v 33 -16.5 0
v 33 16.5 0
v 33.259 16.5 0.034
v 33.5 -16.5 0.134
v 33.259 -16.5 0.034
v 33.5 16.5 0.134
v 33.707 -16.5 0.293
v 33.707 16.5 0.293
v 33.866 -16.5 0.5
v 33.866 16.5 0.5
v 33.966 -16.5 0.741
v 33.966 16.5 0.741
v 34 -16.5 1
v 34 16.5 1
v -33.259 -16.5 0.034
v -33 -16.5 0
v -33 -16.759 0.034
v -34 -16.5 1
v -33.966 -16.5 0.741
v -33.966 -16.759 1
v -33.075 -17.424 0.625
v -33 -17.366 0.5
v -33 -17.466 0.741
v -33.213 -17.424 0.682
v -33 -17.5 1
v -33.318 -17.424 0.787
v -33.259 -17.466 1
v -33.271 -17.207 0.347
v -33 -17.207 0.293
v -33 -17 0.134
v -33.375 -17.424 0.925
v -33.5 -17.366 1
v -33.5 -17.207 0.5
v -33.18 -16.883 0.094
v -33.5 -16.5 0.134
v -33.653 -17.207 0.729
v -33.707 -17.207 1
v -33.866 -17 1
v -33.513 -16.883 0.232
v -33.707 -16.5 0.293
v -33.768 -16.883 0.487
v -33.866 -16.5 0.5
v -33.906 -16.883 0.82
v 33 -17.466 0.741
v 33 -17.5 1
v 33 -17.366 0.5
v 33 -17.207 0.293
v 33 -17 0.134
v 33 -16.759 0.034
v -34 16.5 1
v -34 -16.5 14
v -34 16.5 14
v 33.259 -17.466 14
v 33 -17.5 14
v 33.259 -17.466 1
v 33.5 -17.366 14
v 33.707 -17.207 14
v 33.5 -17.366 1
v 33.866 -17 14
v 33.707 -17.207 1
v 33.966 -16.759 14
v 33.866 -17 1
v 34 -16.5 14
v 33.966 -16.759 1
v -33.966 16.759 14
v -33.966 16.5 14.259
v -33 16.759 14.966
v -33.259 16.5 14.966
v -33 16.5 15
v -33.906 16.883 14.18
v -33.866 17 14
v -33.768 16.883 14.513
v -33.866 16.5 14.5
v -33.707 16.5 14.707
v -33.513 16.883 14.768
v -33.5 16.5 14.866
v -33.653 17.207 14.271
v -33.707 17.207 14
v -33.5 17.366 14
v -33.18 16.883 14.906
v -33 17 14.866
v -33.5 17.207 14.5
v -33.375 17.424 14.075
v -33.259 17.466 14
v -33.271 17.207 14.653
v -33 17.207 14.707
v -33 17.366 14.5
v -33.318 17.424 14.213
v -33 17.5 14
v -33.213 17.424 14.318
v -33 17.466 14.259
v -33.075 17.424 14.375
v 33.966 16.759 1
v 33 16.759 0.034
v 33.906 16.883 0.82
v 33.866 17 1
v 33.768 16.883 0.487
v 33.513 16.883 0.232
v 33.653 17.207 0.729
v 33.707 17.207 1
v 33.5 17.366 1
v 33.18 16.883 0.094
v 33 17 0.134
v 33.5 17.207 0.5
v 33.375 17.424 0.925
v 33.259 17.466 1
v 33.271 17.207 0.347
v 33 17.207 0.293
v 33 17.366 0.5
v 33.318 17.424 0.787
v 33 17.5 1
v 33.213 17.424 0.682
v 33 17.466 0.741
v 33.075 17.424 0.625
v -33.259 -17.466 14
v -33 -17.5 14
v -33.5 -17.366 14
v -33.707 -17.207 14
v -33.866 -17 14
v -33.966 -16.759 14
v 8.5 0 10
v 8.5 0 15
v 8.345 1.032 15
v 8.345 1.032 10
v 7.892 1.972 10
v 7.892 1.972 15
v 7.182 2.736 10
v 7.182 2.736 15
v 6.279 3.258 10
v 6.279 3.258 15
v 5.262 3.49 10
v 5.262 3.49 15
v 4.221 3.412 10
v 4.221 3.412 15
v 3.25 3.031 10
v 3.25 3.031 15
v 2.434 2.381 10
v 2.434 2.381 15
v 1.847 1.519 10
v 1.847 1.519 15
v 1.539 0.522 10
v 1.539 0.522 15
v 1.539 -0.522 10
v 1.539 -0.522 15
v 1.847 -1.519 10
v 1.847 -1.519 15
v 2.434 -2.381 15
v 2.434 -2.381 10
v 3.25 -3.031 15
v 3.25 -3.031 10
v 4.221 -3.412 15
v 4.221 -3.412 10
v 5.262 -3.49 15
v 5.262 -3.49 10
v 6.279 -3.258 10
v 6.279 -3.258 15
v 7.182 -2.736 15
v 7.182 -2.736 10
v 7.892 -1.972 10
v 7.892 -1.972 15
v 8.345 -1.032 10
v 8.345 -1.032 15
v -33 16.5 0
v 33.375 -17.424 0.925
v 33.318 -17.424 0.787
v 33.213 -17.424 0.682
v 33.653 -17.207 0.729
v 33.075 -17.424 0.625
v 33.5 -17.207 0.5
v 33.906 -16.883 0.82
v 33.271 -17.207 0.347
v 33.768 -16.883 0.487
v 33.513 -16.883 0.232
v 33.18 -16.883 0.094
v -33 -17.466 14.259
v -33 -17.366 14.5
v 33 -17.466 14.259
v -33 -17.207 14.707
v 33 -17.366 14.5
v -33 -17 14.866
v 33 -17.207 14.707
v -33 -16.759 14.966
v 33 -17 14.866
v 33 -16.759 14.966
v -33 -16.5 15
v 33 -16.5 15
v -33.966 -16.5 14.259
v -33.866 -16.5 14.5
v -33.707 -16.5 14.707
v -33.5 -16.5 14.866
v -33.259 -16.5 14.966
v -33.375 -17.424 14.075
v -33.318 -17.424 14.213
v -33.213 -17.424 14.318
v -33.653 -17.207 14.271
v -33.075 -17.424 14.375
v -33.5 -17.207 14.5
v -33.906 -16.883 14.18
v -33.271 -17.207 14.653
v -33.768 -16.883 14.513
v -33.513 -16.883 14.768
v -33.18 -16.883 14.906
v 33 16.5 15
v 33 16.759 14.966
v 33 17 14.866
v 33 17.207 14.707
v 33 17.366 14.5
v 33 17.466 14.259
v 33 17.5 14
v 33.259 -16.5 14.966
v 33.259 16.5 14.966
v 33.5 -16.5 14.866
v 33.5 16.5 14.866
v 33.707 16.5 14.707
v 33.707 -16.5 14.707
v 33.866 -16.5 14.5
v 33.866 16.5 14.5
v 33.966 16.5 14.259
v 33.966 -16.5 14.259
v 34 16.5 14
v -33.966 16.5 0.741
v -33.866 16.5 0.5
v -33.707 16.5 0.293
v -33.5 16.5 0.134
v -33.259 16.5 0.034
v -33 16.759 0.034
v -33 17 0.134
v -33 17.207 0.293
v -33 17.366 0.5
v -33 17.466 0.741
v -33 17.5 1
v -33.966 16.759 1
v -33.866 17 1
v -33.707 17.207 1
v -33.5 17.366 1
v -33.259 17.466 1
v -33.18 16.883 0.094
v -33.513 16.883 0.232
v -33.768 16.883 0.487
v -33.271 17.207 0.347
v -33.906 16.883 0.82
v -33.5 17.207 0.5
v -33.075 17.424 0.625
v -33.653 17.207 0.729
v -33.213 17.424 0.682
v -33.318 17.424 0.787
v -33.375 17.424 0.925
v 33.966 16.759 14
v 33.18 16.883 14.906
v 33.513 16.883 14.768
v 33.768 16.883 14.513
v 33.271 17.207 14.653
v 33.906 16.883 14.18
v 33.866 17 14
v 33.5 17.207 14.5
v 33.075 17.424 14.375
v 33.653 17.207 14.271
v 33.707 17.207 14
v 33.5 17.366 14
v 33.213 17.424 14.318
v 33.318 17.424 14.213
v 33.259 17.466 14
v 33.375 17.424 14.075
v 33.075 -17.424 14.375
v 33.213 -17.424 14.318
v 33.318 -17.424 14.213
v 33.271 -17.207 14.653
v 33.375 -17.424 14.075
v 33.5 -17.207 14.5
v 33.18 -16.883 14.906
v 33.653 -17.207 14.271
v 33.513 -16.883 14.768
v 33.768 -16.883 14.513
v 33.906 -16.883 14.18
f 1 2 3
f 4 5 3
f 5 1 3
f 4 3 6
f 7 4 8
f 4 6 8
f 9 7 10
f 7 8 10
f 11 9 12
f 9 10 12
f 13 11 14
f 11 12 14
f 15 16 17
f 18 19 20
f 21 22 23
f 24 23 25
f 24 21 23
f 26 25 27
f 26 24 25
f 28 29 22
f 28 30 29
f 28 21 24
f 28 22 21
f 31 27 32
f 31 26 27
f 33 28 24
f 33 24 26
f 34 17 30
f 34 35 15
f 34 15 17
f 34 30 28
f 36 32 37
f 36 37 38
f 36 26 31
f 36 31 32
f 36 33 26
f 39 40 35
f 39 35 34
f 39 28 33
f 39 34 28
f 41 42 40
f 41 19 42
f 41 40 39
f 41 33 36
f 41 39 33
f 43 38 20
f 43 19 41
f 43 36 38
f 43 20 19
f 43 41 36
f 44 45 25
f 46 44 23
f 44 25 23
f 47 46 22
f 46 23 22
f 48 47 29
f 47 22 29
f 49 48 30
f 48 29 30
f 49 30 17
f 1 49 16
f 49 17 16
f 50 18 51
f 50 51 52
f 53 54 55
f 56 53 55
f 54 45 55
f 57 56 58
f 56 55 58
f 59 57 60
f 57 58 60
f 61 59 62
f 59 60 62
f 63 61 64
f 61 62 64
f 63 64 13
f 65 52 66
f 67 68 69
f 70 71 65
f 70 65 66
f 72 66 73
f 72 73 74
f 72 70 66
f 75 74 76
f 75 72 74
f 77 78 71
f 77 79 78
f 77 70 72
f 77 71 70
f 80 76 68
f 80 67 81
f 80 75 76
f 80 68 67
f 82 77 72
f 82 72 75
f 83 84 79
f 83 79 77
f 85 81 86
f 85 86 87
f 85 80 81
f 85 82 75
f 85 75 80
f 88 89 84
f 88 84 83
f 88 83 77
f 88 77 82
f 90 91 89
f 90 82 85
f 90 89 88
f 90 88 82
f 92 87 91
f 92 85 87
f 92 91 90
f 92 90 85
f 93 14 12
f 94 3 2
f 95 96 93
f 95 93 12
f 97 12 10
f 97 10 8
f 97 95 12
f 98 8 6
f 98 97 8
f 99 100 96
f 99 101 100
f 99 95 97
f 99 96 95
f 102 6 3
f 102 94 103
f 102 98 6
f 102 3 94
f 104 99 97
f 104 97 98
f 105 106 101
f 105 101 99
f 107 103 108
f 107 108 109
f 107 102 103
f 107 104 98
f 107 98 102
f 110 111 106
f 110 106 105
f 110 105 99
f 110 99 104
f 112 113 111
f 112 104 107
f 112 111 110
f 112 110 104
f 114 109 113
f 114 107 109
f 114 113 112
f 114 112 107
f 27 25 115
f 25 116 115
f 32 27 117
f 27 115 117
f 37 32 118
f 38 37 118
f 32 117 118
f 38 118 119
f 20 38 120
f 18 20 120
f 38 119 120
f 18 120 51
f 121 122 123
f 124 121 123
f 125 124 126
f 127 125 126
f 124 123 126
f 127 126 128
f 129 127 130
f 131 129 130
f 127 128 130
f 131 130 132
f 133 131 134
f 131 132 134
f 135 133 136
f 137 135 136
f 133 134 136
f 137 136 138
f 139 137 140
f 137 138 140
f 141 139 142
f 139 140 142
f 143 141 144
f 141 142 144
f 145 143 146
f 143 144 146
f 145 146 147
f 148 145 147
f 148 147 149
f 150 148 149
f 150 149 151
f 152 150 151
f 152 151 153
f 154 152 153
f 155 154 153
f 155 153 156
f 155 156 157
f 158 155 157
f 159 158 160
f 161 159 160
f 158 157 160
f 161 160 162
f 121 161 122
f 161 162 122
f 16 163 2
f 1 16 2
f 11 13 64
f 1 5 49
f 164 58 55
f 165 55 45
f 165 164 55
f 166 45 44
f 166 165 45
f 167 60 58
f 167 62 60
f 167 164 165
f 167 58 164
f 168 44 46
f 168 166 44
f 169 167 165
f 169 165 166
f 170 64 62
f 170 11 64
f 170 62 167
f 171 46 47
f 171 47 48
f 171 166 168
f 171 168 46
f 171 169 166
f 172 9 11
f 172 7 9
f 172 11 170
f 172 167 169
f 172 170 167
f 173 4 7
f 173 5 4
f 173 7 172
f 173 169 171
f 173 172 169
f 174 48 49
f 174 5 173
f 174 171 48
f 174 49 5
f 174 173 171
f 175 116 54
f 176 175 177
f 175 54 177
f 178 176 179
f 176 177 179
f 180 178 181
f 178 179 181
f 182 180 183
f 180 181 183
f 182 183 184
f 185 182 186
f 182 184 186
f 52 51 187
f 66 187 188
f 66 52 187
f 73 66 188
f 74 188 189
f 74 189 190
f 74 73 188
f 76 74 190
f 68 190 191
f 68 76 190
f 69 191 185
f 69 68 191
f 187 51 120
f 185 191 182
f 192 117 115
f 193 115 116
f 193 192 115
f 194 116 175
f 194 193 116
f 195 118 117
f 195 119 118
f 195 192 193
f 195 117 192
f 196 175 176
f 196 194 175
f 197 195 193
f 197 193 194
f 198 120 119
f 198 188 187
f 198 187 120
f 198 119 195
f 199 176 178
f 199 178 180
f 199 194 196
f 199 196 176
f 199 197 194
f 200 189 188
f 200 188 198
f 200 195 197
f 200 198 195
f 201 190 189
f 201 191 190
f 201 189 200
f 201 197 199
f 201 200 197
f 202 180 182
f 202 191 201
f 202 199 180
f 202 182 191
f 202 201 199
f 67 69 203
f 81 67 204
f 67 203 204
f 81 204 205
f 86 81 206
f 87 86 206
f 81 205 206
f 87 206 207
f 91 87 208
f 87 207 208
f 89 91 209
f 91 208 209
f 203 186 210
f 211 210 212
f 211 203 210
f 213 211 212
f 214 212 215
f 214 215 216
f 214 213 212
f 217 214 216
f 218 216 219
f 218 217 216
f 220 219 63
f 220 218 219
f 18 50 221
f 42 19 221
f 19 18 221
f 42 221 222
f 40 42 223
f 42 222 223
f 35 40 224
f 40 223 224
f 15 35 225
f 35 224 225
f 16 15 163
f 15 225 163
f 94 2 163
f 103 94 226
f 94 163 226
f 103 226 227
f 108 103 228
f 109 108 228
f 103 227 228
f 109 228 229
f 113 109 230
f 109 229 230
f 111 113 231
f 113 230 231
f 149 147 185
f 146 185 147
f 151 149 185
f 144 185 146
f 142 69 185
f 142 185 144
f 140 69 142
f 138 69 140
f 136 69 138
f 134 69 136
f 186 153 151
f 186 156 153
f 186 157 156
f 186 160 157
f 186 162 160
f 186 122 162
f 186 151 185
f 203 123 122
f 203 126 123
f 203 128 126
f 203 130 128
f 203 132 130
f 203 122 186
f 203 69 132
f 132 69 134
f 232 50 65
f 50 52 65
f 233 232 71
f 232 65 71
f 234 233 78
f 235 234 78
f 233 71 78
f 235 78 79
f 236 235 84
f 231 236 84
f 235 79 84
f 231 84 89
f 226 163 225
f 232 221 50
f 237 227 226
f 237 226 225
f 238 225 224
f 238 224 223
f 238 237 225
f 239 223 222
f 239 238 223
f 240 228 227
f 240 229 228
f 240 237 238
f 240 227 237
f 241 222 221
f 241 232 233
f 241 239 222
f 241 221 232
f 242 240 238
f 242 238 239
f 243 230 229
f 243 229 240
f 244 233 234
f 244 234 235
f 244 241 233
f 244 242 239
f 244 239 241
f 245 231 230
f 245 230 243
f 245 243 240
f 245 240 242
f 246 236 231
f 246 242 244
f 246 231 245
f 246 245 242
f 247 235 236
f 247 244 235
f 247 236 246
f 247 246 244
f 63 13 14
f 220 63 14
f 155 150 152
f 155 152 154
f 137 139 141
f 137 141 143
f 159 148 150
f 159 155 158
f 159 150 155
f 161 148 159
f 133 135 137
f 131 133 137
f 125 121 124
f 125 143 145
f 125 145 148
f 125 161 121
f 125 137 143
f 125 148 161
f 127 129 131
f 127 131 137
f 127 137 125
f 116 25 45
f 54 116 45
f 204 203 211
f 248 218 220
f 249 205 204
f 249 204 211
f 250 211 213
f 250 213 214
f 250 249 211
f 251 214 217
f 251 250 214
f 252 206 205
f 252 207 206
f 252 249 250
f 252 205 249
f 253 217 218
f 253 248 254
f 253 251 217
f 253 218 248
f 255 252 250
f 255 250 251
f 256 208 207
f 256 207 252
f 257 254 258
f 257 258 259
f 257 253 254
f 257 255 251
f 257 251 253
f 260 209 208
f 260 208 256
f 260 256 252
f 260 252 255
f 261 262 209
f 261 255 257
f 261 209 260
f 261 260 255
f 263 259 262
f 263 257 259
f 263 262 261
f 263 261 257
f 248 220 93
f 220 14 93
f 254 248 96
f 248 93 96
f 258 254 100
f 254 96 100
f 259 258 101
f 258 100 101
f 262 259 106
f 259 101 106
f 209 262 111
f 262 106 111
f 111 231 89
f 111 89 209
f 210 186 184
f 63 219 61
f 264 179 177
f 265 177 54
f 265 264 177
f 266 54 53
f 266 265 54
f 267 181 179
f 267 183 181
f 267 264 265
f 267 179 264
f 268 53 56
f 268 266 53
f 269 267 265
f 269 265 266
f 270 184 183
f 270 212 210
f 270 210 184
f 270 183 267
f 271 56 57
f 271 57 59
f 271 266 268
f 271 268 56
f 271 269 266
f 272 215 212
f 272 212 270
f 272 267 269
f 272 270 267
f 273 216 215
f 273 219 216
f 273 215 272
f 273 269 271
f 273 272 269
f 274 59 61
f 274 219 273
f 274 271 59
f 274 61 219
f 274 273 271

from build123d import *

# Parameters (mm, degrees)
SKETCH1_W           = 68
SKETCH1_H           = 35
BOSS_EXTRUDE1_DEPTH = 15
FILLET1_R           = 1
FILLET2_R           = 1
FILLET3_R           = 1
FILLET4_R           = 1
SKETCH2_R           = 3.5
CUT_EXTRUDE1_DEPTH  = 5


with BuildPart() as part:
    # Sketch1 → Boss-Extrude1 (new body)
    with BuildSketch(Plane.XY):
        Rectangle(SKETCH1_W, SKETCH1_H)
    extrude(amount=BOSS_EXTRUDE1_DEPTH)

    # Fillet1
    fillet1_edges = [part.edges().sort_by_distance(p)[0] for p in [
        (-34, 0, 15),
        (-34, 0, 0),
    ]]
    fillet(fillet1_edges, radius=FILLET1_R)

    # Fillet2
    fillet2_edges = [part.edges().sort_by_distance(p)[0] for p in [
        (34, 0, 15),
        (34, 0, 0),
    ]]
    fillet(fillet2_edges, radius=FILLET2_R)

    # Fillet3
    fillet3_edges = [part.edges().sort_by_distance(p)[0] for p in [
        (-34, -17.5, 7.5),
        (0, -17.5, 0),
        (0, -17.5, 15),
        (-33.707106781, -17.5, 14.707106781),
        (-33.707106781, -17.5, 0.292893219),
        (34, -17.5, 7.5),
        (33.707106781, -17.5, 14.707106781),
        (33.707106781, -17.5, 0.292893219),
    ]]
    fillet(fillet3_edges, radius=FILLET3_R)

    # Fillet4
    fillet4_edges = [part.edges().sort_by_distance(p)[0] for p in [
        (-34, 17.5, 7.5),
        (-33.707106781, 17.5, 14.707106781),
        (-33.707106781, 17.5, 0.292893219),
        (34, 17.5, 7.5),
        (0, 17.5, 0),
        (0, 17.5, 15),
        (33.707106781, 17.5, 14.707106781),
        (33.707106781, 17.5, 0.292893219),
    ]]
    fillet(fillet4_edges, radius=FILLET4_R)

    # Sketch2 → Cut-Extrude1 (cut)
    with BuildSketch(Plane.XY.offset(15)):
        with Locations((5, 0)):
            Circle(SKETCH2_R)
    extrude(amount=-CUT_EXTRUDE1_DEPTH, mode=Mode.SUBTRACT)


solid = part.part
